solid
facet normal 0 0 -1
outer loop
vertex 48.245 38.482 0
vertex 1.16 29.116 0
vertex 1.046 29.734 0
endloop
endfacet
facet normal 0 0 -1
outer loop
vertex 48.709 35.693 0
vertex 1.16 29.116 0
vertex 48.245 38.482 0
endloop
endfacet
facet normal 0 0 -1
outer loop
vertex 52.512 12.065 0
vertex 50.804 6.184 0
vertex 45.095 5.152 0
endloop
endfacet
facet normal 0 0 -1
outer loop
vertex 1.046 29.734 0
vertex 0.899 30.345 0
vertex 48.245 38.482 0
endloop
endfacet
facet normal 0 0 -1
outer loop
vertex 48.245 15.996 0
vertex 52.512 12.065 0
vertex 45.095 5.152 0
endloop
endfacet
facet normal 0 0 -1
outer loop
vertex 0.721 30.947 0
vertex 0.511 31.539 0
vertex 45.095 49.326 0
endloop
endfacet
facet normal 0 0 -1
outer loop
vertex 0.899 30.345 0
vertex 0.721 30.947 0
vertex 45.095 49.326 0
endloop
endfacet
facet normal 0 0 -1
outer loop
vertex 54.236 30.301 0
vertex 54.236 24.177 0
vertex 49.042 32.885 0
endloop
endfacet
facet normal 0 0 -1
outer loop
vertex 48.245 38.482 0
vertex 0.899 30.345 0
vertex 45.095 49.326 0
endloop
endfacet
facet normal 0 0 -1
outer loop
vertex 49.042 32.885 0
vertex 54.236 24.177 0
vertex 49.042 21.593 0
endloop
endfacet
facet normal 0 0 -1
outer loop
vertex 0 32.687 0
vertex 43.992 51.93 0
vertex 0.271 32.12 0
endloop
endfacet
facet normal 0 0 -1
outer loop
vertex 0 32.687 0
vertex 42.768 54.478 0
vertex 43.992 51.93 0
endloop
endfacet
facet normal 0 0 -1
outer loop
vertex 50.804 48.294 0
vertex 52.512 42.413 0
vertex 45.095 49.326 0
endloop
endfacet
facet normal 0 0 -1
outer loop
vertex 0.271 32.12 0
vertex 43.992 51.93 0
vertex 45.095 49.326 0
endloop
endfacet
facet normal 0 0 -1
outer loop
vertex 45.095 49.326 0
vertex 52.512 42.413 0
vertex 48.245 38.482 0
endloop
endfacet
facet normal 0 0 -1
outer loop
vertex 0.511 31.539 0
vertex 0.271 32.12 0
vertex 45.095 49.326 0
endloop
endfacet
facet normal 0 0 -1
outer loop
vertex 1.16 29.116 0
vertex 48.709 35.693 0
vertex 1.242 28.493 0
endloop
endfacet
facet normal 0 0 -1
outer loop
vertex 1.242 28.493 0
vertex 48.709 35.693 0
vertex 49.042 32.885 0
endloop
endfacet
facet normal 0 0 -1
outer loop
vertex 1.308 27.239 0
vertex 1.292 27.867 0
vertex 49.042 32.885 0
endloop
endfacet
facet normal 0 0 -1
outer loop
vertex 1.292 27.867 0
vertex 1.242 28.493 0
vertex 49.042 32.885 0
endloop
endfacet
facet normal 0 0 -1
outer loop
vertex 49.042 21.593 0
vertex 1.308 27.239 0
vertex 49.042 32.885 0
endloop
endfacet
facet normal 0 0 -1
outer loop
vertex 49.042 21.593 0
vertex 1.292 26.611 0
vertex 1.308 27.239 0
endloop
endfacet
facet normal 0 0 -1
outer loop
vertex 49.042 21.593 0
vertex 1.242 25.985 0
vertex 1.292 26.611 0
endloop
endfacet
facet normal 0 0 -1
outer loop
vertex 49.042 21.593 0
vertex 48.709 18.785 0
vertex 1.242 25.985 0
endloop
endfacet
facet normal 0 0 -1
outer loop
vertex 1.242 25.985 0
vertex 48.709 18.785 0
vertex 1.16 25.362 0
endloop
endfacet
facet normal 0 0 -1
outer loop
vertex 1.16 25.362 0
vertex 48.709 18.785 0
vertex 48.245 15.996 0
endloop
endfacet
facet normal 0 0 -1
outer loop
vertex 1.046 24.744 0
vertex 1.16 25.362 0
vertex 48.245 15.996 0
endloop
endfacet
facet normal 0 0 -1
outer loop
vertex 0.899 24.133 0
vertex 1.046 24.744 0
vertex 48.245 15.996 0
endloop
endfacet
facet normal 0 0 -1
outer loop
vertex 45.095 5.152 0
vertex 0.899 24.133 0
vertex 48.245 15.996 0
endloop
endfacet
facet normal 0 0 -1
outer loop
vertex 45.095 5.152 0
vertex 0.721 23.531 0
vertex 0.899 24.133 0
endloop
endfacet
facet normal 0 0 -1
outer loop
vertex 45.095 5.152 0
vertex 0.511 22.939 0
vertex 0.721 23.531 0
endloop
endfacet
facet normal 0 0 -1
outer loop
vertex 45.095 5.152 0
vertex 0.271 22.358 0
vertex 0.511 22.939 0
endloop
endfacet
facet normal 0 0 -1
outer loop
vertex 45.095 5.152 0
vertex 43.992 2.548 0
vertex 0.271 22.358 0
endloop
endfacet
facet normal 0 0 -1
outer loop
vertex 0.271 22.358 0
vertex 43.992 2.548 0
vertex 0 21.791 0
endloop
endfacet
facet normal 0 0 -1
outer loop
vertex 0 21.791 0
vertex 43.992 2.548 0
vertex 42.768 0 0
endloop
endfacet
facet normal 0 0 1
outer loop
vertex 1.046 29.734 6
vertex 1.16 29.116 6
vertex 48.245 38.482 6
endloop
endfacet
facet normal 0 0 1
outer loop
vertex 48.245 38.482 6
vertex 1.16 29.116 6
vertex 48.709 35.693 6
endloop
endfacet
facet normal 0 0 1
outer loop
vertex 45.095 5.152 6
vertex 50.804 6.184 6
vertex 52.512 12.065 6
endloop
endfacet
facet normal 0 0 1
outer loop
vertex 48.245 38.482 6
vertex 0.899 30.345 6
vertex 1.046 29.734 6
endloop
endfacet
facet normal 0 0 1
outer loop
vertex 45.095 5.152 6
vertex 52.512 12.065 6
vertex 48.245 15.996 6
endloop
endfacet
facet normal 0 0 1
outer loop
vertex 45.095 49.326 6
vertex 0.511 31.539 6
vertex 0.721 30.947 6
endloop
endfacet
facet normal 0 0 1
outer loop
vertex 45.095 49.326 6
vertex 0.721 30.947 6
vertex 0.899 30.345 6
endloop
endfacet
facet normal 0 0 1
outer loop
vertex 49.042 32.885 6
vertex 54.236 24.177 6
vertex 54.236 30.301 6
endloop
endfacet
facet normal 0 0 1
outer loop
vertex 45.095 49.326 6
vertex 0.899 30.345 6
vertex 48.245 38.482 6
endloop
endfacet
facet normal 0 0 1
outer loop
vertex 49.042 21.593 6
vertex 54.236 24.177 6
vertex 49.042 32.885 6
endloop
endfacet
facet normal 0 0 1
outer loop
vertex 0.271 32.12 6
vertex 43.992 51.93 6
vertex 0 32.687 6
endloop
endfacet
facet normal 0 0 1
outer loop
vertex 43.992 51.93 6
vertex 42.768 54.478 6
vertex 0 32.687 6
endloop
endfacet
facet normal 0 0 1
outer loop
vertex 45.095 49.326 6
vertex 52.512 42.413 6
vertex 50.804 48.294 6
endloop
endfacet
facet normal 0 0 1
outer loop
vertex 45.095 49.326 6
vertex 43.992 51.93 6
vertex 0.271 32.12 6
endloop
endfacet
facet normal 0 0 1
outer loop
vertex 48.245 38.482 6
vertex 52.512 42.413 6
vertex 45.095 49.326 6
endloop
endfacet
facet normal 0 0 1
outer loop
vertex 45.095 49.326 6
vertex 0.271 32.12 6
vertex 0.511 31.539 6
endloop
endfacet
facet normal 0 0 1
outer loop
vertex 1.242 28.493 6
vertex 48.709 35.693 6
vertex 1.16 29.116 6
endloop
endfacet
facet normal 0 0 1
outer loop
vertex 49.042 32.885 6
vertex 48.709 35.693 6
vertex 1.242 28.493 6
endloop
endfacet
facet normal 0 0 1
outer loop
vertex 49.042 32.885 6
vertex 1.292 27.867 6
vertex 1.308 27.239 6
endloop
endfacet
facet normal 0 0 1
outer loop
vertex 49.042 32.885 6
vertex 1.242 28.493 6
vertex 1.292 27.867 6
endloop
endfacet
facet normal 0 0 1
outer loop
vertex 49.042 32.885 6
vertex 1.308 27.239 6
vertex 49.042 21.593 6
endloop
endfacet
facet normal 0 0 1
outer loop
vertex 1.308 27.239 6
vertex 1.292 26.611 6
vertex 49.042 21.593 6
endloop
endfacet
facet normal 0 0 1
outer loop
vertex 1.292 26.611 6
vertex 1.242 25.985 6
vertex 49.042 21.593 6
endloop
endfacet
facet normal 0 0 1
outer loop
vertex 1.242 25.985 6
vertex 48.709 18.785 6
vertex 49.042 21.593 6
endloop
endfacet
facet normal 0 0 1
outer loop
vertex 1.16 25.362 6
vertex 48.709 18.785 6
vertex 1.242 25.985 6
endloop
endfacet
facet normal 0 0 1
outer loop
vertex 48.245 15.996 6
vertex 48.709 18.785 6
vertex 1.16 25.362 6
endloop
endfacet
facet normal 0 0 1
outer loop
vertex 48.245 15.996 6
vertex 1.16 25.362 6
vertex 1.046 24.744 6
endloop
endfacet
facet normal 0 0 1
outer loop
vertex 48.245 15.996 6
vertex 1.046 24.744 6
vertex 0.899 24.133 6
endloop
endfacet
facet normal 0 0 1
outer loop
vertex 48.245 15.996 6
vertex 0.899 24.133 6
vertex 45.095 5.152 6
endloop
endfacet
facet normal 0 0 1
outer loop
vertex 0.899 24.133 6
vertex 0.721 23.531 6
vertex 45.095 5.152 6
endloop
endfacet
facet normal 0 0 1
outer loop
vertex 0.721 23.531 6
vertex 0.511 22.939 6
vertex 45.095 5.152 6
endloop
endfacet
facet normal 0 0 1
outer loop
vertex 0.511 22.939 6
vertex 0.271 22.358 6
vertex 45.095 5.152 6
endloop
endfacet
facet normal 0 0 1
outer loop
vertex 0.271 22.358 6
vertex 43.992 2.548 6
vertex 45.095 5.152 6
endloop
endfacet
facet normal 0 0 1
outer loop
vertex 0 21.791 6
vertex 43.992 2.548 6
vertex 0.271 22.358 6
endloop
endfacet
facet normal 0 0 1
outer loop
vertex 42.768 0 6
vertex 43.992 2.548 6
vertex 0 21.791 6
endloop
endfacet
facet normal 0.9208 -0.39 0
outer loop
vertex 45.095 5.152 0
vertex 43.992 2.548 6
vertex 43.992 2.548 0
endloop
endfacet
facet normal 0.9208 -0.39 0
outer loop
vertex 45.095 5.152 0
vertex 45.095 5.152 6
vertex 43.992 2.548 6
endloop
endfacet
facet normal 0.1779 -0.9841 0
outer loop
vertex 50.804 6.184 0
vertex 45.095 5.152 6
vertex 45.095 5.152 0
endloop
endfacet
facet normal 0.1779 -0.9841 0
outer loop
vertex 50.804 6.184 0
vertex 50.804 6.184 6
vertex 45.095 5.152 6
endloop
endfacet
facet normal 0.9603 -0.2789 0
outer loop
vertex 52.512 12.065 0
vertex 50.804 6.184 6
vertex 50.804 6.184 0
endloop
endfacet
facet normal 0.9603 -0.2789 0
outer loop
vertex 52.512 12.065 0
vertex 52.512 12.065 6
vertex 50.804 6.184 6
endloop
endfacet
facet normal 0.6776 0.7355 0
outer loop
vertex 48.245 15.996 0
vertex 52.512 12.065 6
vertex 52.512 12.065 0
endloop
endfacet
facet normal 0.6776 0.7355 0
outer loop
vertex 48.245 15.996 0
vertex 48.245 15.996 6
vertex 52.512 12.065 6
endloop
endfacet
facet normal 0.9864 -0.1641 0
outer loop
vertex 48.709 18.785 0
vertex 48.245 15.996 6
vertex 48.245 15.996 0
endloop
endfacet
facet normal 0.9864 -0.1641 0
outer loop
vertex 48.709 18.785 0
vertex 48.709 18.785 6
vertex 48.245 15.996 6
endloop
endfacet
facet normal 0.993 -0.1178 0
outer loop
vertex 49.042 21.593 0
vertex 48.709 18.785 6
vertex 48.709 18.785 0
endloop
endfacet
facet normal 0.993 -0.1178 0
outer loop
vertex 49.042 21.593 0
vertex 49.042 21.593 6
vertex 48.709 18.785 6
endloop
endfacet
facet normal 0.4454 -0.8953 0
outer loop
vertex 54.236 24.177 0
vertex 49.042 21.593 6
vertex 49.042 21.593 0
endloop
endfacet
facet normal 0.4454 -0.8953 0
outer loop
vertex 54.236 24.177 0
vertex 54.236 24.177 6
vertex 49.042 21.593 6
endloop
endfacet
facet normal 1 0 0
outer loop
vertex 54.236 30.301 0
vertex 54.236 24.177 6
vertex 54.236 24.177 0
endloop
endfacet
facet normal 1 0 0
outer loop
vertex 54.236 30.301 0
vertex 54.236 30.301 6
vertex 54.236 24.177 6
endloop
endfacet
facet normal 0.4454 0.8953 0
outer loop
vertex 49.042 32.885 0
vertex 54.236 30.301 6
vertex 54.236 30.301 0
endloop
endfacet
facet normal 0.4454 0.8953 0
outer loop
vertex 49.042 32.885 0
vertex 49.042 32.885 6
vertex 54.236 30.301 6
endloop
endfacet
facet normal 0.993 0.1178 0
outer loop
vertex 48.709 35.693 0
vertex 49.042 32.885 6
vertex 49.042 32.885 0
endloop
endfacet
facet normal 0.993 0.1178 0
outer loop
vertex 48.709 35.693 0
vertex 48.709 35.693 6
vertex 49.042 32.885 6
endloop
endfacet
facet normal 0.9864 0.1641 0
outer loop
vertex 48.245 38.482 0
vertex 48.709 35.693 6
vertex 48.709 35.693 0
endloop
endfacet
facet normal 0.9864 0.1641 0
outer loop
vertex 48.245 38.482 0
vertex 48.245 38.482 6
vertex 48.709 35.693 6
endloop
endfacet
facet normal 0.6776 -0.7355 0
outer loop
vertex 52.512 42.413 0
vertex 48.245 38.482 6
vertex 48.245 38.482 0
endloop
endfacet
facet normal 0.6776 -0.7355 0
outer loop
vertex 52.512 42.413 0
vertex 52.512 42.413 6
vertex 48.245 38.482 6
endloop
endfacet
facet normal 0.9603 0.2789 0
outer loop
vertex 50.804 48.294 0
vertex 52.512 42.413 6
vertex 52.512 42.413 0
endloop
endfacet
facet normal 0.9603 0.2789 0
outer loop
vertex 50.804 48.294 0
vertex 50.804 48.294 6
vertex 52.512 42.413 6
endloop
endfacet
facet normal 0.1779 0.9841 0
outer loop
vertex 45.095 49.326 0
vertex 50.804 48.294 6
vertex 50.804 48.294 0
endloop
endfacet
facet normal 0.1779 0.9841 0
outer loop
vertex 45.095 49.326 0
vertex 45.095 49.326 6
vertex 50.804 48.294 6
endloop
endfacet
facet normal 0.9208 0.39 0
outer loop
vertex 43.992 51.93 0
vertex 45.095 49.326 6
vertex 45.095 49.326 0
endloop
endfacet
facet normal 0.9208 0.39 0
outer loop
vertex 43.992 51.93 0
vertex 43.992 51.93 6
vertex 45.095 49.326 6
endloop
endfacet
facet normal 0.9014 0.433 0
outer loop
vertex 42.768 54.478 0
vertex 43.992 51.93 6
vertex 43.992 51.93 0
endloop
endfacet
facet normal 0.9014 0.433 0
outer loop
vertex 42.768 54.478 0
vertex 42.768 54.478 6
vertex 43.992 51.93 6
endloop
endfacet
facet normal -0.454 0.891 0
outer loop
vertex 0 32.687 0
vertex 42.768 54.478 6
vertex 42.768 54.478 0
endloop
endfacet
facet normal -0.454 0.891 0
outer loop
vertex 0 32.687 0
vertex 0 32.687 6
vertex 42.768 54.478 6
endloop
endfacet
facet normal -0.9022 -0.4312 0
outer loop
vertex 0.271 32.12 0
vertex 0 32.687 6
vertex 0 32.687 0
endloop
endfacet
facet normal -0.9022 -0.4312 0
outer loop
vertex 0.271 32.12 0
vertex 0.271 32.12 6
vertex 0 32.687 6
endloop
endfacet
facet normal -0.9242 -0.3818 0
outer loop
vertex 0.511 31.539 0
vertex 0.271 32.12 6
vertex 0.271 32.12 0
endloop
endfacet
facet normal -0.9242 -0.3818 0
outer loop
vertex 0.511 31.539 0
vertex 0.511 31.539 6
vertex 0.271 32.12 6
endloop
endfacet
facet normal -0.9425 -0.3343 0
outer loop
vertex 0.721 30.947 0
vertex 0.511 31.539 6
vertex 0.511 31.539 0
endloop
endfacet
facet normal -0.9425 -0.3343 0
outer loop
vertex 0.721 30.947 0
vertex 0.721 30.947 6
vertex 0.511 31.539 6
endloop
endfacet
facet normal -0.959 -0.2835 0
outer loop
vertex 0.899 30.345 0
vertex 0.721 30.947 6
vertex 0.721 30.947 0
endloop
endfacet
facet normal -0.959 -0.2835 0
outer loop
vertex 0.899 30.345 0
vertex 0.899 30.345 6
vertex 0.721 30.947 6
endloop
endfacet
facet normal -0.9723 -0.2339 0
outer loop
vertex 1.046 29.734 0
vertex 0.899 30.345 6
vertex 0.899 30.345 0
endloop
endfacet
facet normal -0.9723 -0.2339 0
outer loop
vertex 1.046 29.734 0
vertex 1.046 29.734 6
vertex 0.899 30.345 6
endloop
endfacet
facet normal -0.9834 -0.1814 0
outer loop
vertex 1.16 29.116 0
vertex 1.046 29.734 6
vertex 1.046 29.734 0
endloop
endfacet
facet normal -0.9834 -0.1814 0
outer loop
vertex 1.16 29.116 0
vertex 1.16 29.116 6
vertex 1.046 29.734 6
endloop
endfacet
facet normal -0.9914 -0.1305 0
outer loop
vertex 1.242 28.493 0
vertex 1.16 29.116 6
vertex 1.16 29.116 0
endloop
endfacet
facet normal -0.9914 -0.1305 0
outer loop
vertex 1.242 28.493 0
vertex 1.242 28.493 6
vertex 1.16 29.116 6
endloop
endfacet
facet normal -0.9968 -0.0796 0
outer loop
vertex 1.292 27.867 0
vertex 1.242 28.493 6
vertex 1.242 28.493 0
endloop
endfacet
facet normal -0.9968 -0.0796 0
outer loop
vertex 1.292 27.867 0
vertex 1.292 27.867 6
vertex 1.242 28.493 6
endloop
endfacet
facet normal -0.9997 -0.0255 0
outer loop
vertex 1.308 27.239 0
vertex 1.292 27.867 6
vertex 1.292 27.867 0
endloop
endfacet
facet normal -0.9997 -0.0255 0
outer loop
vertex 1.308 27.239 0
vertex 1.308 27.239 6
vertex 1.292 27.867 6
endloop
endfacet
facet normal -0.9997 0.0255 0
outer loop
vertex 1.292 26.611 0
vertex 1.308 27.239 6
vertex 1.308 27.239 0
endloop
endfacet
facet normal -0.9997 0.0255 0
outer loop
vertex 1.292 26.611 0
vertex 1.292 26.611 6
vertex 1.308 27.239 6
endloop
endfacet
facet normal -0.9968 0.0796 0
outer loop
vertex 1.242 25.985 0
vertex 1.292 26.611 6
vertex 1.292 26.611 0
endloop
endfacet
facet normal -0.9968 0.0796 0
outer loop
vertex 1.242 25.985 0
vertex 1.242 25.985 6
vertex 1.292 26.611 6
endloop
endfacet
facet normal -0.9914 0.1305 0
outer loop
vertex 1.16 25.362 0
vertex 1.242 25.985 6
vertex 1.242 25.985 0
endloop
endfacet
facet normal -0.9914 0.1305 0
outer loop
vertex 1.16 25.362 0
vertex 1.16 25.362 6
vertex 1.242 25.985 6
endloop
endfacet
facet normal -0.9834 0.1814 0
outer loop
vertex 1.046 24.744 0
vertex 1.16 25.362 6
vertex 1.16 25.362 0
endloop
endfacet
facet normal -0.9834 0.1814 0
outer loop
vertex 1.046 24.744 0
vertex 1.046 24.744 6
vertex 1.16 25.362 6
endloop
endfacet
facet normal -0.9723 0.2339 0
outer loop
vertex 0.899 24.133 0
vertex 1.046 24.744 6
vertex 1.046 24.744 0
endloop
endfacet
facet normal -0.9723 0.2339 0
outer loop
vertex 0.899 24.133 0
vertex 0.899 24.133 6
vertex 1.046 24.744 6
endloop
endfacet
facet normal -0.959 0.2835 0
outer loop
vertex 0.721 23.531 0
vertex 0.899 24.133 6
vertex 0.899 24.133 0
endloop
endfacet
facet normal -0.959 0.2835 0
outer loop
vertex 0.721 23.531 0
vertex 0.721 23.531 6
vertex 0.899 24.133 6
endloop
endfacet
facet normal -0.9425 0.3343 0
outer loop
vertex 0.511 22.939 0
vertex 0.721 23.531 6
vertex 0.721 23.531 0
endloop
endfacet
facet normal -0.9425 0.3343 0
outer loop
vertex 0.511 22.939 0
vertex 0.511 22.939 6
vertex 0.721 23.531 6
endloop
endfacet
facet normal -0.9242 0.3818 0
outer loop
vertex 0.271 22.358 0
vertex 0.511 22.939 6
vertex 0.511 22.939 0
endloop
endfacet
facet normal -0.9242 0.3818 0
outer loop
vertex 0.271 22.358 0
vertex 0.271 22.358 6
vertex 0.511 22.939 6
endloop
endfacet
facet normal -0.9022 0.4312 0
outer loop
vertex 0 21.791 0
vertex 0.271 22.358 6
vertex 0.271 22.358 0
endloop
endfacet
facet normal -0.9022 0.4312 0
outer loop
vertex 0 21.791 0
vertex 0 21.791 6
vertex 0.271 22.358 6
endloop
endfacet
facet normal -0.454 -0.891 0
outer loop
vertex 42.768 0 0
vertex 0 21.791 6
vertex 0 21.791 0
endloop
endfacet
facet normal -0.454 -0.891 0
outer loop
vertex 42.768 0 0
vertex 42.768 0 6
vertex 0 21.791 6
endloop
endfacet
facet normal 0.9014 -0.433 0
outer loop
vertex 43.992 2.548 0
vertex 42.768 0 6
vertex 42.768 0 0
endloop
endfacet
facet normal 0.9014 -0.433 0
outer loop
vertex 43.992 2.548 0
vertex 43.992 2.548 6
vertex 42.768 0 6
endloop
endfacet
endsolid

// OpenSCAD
$fn = 32;

// ----------------------------------------------------------------------
// Gear sector: 3 teeth on 54 degrees
// ----------------------------------------------------------------------

// --- parameters (mm) ---
sector_angle = 54;        // sector angle, degrees
root_r = 60;              // root circle radius
tooth_h = 5;              // tooth height over the root circle
teeth = 3;                // number of teeth on the sector
hub_r = 12;               // hub bore radius
plate_t = 6;              // sector thickness, Z
arc_step = 3;             // sampling step of the root/hub arcs, degrees

tip_r = root_r + tooth_h;  // tip circle radius

profile = [[42.768, 0], [43.992, 2.548], [45.095, 5.152], [50.804, 6.184], [52.512, 12.065], [48.245, 15.996], [48.709, 18.785], [49.042, 21.593], [54.236, 24.177], [54.236, 30.301], [49.042, 32.885], [48.709, 35.693], [48.245, 38.482], [52.512, 42.413], [50.804, 48.294], [45.095, 49.326], [43.992, 51.93], [42.768, 54.478], [0, 32.687], [0.271, 32.12], [0.511, 31.539], [0.721, 30.947], [0.899, 30.345], [1.046, 29.734], [1.16, 29.116], [1.242, 28.493], [1.292, 27.867], [1.308, 27.239], [1.292, 26.611], [1.242, 25.985], [1.16, 25.362], [1.046, 24.744], [0.899, 24.133], [0.721, 23.531], [0.511, 22.939], [0.271, 22.358], [0, 21.791]];  // primary outline, 37 points, counter clockwise

// --- the one profile operation ---
linear_extrude(height = plate_t) polygon(points = profile);
